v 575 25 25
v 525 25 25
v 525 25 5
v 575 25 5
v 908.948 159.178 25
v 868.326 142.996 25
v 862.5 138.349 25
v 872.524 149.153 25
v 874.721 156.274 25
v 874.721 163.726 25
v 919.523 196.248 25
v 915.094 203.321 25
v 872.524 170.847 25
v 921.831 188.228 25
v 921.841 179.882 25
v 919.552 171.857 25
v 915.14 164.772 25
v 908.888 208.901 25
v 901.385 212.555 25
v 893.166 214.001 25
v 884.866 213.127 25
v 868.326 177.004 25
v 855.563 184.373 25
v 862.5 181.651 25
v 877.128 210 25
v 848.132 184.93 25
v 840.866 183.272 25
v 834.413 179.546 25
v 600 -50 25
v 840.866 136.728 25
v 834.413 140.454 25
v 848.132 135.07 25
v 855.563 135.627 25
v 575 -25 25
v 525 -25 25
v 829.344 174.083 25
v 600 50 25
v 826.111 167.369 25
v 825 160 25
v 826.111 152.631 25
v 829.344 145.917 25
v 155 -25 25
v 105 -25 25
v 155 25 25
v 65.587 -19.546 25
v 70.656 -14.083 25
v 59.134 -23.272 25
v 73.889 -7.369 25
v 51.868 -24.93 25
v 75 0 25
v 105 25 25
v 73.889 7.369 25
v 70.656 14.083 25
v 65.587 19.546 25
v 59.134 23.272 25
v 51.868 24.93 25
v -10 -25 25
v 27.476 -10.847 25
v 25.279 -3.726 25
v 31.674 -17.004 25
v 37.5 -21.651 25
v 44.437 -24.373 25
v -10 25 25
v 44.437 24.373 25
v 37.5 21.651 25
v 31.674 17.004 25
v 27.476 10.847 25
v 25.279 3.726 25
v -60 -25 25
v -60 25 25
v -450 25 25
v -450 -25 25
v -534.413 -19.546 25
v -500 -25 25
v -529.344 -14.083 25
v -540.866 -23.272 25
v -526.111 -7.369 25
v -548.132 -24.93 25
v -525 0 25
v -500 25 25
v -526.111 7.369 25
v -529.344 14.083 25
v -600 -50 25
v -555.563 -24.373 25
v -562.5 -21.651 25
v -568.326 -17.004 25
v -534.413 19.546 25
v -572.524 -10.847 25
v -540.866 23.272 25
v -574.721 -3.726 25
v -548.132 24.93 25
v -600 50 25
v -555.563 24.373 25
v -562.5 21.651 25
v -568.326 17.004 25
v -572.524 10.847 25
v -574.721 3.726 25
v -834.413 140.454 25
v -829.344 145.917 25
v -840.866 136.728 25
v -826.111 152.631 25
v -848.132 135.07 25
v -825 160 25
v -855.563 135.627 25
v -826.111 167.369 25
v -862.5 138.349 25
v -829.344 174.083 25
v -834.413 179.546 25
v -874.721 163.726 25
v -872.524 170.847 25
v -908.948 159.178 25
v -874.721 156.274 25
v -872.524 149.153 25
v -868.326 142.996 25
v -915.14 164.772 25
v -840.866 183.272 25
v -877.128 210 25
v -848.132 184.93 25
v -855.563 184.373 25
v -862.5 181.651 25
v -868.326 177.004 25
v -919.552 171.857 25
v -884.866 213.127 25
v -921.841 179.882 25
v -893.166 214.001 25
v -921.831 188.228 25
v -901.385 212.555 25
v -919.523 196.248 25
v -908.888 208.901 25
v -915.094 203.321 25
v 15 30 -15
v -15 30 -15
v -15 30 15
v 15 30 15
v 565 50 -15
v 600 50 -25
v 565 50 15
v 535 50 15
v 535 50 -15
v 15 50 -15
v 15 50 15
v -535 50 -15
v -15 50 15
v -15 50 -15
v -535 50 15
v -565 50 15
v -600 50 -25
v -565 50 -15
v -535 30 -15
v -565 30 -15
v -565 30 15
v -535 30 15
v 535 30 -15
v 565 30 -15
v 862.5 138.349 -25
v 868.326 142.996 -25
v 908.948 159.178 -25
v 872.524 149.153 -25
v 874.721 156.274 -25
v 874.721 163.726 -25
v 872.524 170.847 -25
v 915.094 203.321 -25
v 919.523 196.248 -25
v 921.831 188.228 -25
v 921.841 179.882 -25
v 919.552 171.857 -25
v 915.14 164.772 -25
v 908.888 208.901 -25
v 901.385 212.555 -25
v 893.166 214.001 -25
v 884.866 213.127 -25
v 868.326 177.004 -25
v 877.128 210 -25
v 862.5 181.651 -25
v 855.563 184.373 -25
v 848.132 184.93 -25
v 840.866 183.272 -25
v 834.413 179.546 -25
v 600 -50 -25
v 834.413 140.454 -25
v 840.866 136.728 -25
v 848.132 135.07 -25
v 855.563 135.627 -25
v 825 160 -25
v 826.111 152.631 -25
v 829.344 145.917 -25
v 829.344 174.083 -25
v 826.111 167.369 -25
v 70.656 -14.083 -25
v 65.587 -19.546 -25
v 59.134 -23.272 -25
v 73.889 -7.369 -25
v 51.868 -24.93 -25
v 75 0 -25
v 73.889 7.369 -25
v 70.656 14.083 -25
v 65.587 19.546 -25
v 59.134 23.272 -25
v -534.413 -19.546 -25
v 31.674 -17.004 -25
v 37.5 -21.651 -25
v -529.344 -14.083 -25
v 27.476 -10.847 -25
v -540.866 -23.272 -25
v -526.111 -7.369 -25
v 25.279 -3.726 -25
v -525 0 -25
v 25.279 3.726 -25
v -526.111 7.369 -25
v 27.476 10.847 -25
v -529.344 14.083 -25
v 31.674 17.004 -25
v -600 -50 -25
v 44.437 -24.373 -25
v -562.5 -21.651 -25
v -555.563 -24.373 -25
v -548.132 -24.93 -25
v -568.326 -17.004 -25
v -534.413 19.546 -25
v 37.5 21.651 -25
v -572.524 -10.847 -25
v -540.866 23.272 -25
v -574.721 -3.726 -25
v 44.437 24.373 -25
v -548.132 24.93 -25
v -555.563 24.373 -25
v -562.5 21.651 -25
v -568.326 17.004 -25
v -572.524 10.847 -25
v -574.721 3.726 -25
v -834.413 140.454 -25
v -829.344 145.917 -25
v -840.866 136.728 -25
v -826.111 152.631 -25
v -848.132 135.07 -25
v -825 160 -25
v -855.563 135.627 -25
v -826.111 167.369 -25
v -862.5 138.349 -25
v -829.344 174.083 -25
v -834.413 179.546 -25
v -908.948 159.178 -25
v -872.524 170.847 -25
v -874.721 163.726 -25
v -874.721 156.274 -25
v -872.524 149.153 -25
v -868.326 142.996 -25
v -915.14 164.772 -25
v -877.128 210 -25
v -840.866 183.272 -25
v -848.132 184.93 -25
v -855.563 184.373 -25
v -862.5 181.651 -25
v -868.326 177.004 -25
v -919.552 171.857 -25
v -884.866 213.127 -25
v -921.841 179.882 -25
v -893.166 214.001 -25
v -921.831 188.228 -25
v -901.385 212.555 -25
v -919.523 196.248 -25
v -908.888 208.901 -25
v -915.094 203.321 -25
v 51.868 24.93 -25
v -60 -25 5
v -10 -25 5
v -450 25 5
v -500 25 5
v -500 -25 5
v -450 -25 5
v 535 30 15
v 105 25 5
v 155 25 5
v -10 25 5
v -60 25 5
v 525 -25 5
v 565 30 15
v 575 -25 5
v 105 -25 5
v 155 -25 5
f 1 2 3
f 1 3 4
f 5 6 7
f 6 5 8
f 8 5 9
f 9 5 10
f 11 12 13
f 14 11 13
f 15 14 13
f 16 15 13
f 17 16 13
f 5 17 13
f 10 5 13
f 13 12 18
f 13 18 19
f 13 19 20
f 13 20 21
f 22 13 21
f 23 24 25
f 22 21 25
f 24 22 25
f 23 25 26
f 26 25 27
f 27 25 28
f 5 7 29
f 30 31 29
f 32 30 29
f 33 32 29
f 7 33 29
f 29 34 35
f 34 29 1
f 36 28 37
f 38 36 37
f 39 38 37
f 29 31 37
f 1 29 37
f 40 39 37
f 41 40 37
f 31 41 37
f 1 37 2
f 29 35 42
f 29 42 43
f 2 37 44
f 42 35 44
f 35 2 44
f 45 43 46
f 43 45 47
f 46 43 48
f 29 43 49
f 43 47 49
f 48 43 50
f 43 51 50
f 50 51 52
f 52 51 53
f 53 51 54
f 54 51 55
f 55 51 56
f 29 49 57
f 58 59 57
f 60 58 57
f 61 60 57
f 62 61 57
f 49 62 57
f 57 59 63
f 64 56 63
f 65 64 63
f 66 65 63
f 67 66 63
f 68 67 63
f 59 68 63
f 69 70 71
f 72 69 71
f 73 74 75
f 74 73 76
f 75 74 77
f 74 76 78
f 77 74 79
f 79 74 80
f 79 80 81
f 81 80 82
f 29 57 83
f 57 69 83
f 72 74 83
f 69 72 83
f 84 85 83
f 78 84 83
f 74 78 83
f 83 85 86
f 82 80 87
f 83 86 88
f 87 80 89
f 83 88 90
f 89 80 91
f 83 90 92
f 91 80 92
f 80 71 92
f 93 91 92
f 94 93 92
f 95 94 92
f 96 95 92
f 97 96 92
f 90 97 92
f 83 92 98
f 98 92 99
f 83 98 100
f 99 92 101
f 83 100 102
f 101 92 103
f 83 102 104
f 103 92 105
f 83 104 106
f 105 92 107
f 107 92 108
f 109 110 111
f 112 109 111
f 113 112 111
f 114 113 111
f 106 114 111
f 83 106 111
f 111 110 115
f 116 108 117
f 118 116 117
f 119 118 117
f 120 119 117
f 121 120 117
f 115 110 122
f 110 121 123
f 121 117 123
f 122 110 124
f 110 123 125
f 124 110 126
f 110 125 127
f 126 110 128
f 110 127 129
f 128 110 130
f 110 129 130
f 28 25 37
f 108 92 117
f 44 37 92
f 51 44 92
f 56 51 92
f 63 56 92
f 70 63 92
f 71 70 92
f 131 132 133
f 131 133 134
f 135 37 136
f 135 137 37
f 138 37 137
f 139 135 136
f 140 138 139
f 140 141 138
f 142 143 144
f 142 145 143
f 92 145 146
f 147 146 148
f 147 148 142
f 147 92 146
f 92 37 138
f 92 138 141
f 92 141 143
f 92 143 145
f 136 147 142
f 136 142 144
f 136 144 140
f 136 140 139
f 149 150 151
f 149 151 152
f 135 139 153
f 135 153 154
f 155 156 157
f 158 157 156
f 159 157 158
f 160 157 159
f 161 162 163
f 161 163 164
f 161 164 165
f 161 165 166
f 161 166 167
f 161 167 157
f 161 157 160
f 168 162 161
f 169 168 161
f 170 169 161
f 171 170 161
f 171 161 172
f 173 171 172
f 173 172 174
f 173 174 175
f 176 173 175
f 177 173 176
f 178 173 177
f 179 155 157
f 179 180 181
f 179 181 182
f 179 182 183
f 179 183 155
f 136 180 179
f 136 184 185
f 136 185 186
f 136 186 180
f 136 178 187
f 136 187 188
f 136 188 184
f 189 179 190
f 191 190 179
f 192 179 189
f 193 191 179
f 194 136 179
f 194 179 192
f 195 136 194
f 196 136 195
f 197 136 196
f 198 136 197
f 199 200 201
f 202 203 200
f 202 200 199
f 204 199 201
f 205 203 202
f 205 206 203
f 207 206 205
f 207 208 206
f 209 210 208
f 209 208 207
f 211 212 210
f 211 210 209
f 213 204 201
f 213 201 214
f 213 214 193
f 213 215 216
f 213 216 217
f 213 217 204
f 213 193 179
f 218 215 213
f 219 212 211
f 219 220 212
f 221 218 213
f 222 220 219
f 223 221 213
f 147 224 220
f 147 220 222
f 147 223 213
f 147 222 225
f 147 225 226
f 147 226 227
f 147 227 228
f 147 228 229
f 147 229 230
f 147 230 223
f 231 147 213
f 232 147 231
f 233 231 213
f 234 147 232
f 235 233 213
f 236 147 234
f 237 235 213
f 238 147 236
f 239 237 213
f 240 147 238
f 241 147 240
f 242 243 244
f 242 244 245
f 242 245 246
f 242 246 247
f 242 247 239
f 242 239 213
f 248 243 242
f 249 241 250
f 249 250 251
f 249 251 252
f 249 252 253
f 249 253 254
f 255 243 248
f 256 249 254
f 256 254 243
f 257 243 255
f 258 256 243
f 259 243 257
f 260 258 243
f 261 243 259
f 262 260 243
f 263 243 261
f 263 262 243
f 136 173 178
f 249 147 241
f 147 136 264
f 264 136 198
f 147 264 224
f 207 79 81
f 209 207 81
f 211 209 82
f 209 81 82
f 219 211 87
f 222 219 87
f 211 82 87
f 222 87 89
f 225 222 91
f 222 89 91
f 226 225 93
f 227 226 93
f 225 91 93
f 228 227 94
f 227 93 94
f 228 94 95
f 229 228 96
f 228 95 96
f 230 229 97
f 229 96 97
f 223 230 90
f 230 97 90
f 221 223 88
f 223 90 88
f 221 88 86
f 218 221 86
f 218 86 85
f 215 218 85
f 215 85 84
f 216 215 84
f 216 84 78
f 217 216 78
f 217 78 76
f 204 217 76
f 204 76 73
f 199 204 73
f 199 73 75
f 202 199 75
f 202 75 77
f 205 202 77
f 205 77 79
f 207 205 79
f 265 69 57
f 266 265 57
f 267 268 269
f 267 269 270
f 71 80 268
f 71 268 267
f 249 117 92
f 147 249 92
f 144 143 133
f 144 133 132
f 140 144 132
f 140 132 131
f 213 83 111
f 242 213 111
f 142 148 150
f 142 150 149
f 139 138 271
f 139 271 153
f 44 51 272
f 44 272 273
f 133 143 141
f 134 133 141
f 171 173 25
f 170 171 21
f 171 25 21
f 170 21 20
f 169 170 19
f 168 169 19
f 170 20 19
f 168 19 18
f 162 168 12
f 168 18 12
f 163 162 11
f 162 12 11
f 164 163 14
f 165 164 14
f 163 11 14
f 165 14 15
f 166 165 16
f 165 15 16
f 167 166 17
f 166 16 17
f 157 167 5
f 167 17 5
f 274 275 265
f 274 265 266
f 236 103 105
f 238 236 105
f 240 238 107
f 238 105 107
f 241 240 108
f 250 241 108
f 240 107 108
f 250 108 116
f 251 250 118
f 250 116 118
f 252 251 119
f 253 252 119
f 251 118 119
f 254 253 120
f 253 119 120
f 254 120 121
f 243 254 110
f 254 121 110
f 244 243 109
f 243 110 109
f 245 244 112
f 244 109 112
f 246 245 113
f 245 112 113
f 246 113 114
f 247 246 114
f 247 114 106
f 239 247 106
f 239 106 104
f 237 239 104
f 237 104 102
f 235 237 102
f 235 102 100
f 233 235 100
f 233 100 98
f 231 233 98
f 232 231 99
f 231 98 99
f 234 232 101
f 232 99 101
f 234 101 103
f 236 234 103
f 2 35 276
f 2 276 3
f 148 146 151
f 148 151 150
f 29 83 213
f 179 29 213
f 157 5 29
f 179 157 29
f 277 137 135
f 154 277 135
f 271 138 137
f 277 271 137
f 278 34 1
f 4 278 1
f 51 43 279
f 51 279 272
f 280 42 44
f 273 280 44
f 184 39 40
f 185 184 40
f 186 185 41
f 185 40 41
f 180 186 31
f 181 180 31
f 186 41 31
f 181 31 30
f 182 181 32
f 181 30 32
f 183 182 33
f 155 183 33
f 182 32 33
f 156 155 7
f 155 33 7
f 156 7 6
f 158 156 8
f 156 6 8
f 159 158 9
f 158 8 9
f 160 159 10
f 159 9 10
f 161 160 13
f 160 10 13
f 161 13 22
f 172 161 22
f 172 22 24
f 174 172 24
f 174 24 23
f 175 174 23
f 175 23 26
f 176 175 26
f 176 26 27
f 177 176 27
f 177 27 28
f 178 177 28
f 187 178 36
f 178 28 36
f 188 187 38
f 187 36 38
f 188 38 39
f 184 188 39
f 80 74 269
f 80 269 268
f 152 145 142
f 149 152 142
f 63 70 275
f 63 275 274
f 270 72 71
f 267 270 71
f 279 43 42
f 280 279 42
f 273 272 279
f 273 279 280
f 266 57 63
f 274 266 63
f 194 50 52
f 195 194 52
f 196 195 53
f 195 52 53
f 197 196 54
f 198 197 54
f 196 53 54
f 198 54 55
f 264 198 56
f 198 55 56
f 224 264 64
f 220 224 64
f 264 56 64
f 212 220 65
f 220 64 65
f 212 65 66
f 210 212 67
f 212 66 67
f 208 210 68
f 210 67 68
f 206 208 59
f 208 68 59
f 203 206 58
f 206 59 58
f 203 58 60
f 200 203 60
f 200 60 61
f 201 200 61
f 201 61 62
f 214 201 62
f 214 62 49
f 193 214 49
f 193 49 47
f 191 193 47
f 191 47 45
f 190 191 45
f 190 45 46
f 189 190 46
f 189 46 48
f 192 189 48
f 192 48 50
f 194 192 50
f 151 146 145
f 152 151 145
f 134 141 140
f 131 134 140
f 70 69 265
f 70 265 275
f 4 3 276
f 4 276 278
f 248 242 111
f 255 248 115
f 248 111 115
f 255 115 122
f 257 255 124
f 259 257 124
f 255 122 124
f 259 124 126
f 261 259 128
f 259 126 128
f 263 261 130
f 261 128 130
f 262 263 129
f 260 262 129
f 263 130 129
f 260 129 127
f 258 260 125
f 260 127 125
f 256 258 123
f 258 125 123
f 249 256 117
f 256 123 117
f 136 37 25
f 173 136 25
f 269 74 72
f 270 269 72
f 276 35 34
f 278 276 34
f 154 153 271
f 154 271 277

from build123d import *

# Parameters (mm, degrees)
BOSS_EXTRUDE1_DEPTH      = 600
BOSS_EXTRUDE1_DEPTH_BACK = 600
SKETCH1_W                = 50
SKETCH1_H                = 100
BOSS_EXTRUDE2_DEPTH      = 50
SKETCH3_R                = 25
CUT_EXTRUDE1_DEPTH       = 50
SKETCH4_R                = 25
CUT_EXTRUDE2_DEPTH       = 948.9580797
SKETCH5_W                = 50
SKETCH5_H                = 50
CUT_EXTRUDE3_DEPTH       = 20
SKETCH6_W                = 30
SKETCH6_H                = 30
CUT_EXTRUDE4_DEPTH       = 20


with BuildPart() as part:
    # Sketch1 → Boss-Extrude1 (new, two sides: drawn at the far end of the back side and taken through both)
    with BuildSketch(Plane(origin=(0, 0, 0), x_dir=(0, 0, -1), z_dir=(1, 0, 0)).offset(-BOSS_EXTRUDE1_DEPTH_BACK)):
        Rectangle(SKETCH1_W, SKETCH1_H)
    extrude(amount=BOSS_EXTRUDE1_DEPTH + BOSS_EXTRUDE1_DEPTH_BACK)

    # Sketch2 → Boss-Extrude2 (add)
    with BuildSketch(Plane.XY.offset(25)):
        with BuildLine():
            Line((600, 50), (877.128129211, 210))
            ThreePointArc((877.128129211, 210), (917.555611759, 199.939135225), (908.947540593, 159.177591388))
            Line((908.947540593, 159.177591388), (600, -50))
            Line((600, -50), (600, 50))
        make_face()
        with BuildLine():
            Line((-600, 50), (-600, -50))
            Line((-600, -50), (-908.947540593, 159.177591388))
            ThreePointArc((-908.947540593, 159.177591388), (-917.555611759, 199.939135225), (-877.128129211, 210))
            Line((-877.128129211, 210), (-600, 50))
        make_face()
    extrude(amount=-BOSS_EXTRUDE2_DEPTH)

    # Sketch3 → Cut-Extrude1 (cut)
    with BuildSketch(Plane.XY.offset(25)):
        with Locations((-850, 160)):
            Circle(SKETCH3_R)
        with Locations((850, 160)):
            Circle(SKETCH3_R)
    extrude(amount=-CUT_EXTRUDE1_DEPTH, mode=Mode.SUBTRACT)

    # Sketch4 → Cut-Extrude2 (cut, through all)
    with BuildSketch(Plane.XY.offset(25)):
        with Locations((50, 0)):
            Circle(SKETCH4_R)
        with Locations((-550, 0)):
            Circle(SKETCH4_R)
    extrude(amount=-CUT_EXTRUDE2_DEPTH, mode=Mode.SUBTRACT)

    # Sketch5 → Cut-Extrude3 (cut)
    with BuildSketch(Plane.XY.offset(25)):
        with Locations((-35, 0)):
            Rectangle(SKETCH5_W, SKETCH5_H)
        with Locations((-475, 0)):
            Rectangle(SKETCH5_W, SKETCH5_H)
        with Locations((130, 0)):
            Rectangle(SKETCH5_W, SKETCH5_H)
        with Locations((550, 0)):
            Rectangle(SKETCH5_W, SKETCH5_H)
    extrude(amount=-CUT_EXTRUDE3_DEPTH, mode=Mode.SUBTRACT)

    # Sketch6 → Cut-Extrude4 (cut)
    with BuildSketch(Plane(origin=(0, 50, 0), x_dir=(1, 0, 0), z_dir=(0, 1, 0))):
        with Locations((550, 0)):
            Rectangle(SKETCH6_W, SKETCH6_H)
        with Locations((-550, 0)):
            Rectangle(SKETCH6_W, SKETCH6_H)
        Rectangle(SKETCH6_W, SKETCH6_H)
    extrude(amount=-CUT_EXTRUDE4_DEPTH, mode=Mode.SUBTRACT)


solid = part.part
